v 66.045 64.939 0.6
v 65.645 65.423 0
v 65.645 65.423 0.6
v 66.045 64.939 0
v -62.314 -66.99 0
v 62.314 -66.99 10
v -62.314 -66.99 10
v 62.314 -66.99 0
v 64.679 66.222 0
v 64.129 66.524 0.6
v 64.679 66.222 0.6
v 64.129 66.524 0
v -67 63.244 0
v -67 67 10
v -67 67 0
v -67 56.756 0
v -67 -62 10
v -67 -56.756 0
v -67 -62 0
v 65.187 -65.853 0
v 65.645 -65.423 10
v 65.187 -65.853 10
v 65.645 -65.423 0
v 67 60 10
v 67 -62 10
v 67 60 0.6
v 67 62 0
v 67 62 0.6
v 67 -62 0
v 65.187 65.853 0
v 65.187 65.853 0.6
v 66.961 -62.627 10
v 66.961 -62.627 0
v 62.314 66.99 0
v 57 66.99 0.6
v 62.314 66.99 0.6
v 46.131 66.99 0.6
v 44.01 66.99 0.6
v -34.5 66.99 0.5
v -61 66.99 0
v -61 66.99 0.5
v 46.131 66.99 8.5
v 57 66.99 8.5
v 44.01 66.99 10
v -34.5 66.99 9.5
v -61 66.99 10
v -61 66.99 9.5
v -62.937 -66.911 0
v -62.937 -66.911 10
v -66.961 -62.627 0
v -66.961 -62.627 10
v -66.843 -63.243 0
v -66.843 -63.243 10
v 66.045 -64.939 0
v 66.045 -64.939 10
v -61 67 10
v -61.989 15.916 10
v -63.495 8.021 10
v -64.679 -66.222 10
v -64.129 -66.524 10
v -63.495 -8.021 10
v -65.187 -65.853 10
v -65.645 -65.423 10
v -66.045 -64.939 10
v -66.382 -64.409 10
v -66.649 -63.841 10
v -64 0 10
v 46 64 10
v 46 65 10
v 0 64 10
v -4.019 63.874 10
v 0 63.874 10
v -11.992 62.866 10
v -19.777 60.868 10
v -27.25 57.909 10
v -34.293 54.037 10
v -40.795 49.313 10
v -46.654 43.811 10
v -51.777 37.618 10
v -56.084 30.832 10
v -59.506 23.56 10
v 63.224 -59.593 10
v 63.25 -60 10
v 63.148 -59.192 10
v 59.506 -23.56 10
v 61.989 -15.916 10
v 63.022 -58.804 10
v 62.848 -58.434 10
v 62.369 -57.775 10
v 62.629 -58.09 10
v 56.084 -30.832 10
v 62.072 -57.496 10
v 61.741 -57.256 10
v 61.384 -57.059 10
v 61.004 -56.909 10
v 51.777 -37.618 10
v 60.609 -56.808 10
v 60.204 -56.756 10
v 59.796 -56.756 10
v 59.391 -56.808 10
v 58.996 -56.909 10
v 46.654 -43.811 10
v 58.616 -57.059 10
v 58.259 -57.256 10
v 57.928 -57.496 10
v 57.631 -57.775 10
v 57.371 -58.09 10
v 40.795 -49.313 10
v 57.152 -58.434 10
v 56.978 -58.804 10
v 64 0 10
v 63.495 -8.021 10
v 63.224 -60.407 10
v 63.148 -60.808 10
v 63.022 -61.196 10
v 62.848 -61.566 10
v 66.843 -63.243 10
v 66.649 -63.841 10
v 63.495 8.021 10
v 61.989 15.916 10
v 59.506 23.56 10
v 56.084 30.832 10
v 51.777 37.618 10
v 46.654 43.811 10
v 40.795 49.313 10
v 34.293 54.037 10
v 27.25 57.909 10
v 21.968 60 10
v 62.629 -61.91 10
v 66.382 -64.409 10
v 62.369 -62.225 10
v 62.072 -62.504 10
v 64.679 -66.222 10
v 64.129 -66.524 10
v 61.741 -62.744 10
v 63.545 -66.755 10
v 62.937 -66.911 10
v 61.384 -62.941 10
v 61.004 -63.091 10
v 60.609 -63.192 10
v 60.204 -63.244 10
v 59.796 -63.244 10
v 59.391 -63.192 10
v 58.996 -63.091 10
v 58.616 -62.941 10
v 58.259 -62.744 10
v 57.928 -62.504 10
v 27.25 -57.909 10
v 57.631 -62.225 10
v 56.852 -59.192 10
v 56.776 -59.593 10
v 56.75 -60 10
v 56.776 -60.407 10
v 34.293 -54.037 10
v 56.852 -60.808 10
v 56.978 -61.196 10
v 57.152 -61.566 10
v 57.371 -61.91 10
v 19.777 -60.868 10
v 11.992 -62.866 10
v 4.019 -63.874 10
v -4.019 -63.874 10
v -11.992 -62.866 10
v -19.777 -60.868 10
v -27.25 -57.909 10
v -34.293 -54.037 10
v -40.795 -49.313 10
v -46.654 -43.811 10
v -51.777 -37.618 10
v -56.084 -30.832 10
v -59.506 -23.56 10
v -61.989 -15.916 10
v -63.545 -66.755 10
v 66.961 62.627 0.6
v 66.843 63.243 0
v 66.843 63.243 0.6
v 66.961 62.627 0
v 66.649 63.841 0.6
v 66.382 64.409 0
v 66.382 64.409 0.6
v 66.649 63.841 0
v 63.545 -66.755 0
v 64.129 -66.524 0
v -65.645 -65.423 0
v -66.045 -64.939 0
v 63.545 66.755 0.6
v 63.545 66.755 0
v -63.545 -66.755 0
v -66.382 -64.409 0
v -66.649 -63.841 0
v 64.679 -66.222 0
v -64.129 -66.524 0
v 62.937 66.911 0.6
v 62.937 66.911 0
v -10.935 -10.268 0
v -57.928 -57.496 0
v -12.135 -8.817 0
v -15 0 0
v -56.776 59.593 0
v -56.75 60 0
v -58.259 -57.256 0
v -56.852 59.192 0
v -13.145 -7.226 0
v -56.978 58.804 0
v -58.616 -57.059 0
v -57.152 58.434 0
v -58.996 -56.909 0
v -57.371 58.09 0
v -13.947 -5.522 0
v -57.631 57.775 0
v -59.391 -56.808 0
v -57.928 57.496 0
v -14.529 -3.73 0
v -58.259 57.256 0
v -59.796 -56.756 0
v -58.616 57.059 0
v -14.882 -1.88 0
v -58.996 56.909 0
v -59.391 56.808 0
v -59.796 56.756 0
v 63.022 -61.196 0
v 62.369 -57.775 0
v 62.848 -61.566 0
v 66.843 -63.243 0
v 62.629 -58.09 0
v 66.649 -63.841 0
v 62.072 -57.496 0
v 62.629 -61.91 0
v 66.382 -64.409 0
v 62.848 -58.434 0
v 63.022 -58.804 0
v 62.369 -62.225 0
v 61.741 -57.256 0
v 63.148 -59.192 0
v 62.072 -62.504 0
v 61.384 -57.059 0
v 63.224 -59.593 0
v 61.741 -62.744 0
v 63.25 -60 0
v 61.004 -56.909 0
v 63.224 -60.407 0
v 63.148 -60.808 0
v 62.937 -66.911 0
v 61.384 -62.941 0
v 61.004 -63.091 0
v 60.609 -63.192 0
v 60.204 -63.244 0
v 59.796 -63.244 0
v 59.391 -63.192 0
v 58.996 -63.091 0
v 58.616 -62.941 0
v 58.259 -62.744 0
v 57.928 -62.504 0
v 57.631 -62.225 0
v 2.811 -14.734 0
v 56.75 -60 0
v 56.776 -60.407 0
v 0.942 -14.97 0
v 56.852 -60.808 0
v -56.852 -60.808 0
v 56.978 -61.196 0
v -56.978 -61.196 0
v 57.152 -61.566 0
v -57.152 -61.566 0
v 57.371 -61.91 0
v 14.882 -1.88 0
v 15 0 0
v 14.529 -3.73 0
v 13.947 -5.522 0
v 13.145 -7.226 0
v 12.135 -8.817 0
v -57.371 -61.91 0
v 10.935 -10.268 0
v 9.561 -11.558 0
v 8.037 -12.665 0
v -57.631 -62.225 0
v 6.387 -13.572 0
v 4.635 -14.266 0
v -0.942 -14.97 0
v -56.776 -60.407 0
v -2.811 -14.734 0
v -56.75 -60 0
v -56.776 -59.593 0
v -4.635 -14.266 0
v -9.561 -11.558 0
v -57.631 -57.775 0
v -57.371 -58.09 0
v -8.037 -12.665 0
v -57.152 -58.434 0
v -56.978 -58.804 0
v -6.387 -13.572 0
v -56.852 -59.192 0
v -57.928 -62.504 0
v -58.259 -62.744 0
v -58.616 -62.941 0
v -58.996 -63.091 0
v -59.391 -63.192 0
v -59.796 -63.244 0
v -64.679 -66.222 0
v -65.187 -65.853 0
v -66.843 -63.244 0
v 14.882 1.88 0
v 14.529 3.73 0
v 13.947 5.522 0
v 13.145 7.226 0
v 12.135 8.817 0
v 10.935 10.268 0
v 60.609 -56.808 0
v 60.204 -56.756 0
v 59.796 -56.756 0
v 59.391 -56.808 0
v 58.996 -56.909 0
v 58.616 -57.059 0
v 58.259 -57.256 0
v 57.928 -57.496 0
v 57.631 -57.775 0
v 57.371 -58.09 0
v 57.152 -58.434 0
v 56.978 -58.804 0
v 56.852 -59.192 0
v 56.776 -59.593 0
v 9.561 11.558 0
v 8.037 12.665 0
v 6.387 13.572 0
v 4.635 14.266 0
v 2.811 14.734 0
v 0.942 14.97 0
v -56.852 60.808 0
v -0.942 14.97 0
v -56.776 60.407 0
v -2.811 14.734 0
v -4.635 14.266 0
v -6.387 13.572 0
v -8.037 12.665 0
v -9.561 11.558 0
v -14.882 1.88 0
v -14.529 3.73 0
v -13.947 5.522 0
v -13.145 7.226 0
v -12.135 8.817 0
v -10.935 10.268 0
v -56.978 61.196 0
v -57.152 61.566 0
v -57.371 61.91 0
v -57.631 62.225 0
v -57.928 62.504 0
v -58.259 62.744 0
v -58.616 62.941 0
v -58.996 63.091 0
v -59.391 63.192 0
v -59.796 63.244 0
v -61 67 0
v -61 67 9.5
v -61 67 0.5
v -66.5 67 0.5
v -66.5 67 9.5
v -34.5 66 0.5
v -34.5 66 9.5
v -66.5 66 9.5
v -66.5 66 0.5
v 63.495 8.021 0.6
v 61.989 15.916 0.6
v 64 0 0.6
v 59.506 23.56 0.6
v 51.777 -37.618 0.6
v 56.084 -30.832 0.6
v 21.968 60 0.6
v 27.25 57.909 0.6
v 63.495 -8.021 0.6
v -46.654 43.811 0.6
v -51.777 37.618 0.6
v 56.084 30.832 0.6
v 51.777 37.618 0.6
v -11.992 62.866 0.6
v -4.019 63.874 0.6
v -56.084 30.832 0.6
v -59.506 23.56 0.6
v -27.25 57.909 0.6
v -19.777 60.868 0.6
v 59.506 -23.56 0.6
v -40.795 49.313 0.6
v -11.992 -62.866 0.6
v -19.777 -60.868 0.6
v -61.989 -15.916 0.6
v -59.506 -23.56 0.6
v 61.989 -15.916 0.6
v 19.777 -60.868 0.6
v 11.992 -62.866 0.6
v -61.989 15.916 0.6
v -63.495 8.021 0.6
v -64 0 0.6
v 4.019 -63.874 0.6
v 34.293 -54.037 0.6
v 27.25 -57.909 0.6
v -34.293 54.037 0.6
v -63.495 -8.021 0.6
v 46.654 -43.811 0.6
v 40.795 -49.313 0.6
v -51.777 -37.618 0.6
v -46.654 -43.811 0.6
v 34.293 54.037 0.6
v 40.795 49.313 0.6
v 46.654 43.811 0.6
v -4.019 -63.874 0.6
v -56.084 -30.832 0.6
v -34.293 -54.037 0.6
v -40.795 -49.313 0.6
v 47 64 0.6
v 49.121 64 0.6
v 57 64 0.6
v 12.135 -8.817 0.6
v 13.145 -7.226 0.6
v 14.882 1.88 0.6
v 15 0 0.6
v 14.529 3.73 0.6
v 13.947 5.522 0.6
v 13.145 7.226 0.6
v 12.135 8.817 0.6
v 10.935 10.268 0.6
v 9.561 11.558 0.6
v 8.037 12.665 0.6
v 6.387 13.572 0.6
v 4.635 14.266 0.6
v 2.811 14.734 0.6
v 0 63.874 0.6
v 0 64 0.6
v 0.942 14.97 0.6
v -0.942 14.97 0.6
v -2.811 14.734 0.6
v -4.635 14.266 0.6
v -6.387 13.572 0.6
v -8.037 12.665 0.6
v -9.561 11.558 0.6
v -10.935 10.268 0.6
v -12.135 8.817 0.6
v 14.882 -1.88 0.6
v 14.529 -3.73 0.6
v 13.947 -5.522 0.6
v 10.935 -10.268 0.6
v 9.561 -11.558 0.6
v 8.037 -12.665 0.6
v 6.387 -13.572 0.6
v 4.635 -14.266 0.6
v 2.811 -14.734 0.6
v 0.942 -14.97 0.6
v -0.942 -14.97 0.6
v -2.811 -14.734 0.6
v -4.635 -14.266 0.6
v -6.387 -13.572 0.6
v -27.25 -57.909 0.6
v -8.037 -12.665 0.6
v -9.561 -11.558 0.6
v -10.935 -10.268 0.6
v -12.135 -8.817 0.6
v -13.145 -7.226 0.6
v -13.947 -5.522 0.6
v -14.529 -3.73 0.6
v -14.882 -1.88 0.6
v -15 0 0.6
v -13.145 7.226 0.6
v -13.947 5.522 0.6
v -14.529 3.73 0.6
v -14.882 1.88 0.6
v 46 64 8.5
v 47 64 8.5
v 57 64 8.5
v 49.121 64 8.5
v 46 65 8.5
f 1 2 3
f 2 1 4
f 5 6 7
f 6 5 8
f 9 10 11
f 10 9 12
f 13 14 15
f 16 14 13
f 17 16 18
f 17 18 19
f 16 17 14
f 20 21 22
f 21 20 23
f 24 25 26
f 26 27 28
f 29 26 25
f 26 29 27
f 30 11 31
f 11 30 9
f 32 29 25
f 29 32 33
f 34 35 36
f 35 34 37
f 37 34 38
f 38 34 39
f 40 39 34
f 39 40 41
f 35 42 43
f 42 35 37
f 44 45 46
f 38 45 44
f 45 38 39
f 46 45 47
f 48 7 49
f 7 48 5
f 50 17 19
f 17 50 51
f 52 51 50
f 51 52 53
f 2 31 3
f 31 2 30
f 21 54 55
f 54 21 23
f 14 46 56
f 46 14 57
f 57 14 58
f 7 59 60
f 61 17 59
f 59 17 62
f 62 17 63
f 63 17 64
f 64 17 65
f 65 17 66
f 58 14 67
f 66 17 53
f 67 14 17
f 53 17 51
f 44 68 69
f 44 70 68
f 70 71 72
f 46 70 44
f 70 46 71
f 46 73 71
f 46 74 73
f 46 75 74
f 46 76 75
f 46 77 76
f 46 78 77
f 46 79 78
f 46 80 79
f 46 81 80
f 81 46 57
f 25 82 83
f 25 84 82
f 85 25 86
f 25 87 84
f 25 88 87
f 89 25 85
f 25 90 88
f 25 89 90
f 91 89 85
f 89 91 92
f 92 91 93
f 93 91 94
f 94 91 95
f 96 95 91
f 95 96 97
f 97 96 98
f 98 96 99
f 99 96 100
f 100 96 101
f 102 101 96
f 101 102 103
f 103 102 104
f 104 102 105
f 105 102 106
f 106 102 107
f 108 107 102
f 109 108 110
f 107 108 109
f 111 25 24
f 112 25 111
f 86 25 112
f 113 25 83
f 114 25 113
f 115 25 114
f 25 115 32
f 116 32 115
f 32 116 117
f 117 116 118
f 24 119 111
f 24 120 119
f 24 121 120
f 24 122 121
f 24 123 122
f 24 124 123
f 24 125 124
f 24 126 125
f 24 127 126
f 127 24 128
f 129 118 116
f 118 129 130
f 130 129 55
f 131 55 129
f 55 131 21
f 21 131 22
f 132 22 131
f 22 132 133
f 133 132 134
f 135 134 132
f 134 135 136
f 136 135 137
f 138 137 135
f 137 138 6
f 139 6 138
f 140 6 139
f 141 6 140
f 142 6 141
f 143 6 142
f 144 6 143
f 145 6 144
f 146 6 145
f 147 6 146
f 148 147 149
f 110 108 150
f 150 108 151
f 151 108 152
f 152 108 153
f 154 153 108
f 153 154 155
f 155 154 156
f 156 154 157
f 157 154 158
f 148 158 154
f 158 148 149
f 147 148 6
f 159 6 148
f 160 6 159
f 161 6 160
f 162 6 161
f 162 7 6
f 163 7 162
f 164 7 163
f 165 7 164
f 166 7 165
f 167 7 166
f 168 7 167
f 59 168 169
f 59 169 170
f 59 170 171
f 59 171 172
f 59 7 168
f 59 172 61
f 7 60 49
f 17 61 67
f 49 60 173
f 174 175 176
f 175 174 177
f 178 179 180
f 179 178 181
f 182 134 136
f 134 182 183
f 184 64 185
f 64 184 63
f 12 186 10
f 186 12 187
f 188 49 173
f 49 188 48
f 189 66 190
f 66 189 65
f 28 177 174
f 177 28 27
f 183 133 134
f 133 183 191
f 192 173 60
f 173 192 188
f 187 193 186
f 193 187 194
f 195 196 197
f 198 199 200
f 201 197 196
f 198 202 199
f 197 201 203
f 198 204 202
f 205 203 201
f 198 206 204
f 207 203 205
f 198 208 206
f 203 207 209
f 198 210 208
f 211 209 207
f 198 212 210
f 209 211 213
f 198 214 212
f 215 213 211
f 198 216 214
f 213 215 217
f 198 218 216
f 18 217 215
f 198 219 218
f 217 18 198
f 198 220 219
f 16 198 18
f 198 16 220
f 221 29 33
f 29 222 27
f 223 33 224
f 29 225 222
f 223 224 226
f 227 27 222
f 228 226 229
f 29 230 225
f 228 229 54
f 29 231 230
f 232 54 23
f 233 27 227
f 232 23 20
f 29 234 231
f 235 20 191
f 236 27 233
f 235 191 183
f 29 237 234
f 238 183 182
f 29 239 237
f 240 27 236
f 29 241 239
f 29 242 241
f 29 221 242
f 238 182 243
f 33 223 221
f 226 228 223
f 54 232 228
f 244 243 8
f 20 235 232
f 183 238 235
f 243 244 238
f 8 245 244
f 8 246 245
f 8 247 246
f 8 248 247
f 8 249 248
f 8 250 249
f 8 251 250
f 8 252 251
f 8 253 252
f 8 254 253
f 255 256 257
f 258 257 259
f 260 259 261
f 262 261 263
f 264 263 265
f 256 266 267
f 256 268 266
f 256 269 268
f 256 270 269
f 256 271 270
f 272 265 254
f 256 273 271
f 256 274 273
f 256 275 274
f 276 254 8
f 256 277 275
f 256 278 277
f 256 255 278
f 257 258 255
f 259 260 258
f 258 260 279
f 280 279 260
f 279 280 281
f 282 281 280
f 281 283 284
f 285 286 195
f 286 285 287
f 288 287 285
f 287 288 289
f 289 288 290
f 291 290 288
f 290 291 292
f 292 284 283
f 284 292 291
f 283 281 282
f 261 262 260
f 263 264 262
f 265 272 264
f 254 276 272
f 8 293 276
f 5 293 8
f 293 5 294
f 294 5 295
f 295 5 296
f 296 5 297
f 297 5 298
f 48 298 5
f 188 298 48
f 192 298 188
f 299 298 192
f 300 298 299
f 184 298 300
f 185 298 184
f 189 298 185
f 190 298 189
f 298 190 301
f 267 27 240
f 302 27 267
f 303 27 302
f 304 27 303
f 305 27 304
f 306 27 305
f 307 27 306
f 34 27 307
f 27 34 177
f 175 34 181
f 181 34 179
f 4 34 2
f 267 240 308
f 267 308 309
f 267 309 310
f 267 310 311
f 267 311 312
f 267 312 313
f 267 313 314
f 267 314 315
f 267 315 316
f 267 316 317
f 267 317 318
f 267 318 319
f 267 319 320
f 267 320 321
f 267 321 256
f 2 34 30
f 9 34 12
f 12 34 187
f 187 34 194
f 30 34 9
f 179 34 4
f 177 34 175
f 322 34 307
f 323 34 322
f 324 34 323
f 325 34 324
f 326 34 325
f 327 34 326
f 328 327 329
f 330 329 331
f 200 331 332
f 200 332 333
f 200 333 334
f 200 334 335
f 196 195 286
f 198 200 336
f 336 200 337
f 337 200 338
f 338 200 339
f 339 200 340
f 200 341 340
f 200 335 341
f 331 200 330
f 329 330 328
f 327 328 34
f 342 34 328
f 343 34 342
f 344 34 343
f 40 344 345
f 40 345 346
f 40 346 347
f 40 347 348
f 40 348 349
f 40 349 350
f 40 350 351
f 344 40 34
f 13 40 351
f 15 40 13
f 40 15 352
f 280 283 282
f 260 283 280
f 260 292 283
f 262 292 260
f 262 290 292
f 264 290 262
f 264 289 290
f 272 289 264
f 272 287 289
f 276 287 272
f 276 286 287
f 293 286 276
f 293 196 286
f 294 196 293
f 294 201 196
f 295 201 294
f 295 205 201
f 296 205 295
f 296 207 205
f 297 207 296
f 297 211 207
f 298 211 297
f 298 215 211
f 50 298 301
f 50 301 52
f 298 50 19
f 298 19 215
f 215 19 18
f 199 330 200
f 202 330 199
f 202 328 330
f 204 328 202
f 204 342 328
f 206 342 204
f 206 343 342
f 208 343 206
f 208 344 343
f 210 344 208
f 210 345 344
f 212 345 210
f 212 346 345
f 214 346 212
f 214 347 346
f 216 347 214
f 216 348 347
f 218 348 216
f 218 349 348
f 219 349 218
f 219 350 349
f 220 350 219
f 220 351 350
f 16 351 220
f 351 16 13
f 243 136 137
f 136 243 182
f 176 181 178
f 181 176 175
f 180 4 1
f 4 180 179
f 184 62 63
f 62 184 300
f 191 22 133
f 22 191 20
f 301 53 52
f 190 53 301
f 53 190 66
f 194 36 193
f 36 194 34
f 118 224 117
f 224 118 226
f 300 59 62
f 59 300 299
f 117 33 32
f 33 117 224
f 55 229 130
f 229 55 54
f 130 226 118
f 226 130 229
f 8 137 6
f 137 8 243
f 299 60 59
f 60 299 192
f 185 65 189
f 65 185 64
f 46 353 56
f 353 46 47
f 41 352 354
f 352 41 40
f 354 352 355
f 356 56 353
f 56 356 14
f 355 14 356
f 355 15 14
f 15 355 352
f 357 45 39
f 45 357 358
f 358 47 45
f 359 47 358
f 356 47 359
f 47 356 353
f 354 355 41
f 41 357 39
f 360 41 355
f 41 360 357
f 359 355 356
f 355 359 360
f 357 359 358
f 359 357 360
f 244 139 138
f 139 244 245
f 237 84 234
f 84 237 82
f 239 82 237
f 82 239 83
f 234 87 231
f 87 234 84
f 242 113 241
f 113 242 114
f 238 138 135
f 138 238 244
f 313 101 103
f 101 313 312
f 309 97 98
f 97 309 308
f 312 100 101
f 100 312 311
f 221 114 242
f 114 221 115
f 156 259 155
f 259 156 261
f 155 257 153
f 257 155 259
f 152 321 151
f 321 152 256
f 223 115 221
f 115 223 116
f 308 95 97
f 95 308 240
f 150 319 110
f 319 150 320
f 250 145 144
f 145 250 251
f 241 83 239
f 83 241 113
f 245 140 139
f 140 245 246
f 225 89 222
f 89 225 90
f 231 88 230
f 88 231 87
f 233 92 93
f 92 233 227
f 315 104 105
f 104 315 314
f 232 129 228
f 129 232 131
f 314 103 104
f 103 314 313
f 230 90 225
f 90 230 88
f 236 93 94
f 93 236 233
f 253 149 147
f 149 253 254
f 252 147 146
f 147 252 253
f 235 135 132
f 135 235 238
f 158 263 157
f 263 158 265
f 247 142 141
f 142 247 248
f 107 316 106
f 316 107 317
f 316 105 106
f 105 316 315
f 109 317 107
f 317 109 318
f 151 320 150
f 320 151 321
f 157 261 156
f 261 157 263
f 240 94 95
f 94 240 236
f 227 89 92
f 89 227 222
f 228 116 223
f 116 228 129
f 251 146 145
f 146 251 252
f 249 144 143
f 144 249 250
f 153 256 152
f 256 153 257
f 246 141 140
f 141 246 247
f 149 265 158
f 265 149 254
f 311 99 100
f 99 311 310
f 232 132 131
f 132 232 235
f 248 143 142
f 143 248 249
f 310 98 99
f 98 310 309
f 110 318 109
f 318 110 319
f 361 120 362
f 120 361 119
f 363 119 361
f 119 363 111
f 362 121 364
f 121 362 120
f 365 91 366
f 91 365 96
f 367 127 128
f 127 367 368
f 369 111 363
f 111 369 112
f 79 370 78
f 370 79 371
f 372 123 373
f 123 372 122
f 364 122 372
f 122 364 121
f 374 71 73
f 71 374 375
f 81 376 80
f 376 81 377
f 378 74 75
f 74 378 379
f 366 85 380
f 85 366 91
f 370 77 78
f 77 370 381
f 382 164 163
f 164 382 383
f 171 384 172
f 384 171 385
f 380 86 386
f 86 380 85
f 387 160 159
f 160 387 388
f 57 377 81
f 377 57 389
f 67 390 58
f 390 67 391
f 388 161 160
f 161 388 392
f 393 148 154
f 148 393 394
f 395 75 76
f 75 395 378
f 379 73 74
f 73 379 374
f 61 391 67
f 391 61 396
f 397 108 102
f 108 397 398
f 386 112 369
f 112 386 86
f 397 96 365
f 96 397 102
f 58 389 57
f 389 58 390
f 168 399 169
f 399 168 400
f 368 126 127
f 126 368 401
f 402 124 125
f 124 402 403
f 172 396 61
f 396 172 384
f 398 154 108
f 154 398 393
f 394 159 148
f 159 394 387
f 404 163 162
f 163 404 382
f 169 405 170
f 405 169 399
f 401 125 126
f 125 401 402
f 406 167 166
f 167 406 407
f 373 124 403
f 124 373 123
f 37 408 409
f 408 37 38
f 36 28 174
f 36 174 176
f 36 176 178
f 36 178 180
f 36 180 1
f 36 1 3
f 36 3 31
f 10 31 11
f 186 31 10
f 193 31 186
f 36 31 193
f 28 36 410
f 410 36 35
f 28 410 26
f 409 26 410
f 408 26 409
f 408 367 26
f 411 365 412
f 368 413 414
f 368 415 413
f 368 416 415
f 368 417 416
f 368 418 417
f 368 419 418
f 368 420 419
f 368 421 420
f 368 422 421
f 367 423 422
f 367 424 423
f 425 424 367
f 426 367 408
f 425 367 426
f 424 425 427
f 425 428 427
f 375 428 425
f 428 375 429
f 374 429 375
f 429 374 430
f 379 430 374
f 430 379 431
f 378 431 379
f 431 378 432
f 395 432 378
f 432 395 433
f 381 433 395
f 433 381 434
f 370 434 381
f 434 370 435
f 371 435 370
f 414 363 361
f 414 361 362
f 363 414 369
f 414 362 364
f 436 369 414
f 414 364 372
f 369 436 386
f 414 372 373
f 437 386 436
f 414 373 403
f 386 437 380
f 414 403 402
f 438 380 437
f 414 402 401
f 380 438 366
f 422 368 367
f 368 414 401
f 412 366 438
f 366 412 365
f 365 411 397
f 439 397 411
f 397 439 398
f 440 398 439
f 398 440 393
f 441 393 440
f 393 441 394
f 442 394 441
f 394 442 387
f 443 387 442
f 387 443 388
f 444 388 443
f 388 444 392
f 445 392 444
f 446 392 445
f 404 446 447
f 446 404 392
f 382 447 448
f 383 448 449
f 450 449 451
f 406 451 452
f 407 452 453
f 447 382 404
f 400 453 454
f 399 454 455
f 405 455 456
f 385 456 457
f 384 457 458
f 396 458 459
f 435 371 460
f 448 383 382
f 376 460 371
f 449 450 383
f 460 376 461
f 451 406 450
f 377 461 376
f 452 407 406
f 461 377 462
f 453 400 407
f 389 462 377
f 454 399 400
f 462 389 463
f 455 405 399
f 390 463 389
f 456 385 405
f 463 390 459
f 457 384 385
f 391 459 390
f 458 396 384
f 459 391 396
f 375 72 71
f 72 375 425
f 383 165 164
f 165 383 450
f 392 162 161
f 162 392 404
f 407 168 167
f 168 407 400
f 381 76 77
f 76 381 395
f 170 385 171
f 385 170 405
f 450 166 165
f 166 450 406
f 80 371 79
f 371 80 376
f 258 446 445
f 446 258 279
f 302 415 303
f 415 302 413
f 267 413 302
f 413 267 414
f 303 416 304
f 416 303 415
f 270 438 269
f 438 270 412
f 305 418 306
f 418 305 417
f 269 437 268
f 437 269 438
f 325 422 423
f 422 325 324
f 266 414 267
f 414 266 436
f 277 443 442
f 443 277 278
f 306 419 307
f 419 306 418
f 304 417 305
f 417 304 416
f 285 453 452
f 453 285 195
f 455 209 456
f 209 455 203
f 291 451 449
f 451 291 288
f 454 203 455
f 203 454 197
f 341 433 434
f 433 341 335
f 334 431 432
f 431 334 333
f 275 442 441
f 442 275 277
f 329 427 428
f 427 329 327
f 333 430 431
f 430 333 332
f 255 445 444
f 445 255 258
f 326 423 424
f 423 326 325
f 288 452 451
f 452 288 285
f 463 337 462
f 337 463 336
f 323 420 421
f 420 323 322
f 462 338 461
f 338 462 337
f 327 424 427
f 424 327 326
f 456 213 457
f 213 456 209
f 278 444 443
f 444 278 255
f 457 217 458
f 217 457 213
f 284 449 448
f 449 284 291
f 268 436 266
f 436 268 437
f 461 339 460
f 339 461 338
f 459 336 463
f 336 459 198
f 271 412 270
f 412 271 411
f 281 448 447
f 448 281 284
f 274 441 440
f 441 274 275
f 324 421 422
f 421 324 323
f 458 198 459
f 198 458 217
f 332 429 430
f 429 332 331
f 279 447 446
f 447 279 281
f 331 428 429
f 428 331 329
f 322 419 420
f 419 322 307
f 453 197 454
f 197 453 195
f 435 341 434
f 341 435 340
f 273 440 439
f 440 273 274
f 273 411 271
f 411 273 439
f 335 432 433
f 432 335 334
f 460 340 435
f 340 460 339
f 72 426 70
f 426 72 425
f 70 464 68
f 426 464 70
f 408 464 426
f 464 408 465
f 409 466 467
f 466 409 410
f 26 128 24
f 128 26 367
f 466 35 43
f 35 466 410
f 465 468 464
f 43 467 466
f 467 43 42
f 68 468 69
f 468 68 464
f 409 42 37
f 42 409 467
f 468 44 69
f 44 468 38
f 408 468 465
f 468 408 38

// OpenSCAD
$fn = 50;


difference() {
	union() {
		hull() {
			translate(v = [-62.0000000000, 62.0000000000, 0]) {
				cylinder(h = 10, r = 5);
			}
			translate(v = [62.0000000000, 62.0000000000, 0]) {
				cylinder(h = 10, r = 5);
			}
			translate(v = [-62.0000000000, -62.0000000000, 0]) {
				cylinder(h = 10, r = 5);
			}
			translate(v = [62.0000000000, -62.0000000000, 0]) {
				cylinder(h = 10, r = 5);
			}
		}
		translate(v = [-67.0000000000, 61.0000000000, 0]) {
			cube(size = [6, 6, 10]);
		}
	}
	union() {
		translate(v = [-67.5000000000, -60.0000000000, -250.0000000000]) {
			rotate(a = [0, 0, 0]) {
				difference() {
					union() {
						hull() {
							translate(v = [7.5000000000, 0, 0]) {
								cylinder(h = 250, r = 3.2500000000, r1 = 3.2500000000, r2 = 3.2500000000);
							}
							translate(v = [-7.5000000000, 0, 0]) {
								cylinder(h = 250, r = 3.2500000000, r1 = 3.2500000000, r2 = 3.2500000000);
							}
						}
					}
					union();
				}
			}
		}
		translate(v = [-67.5000000000, 60.0000000000, -250.0000000000]) {
			rotate(a = [0, 0, 0]) {
				difference() {
					union() {
						hull() {
							translate(v = [7.5000000000, 0, 0]) {
								cylinder(h = 250, r = 3.2500000000, r1 = 3.2500000000, r2 = 3.2500000000);
							}
							translate(v = [-7.5000000000, 0, 0]) {
								cylinder(h = 250, r = 3.2500000000, r1 = 3.2500000000, r2 = 3.2500000000);
							}
						}
					}
					union();
				}
			}
		}
		translate(v = [-66.5000000000, 66.0000000000, 0.5000000000]) {
			cube(size = [32, 1, 9.0000000000]);
		}
		translate(v = [60.0000000000, -60.0000000000, -50.0000000000]) {
			cylinder(h = 100, r = 3.2500000000);
		}
		translate(v = [0, 0, 0.6000000000]) {
			cylinder(h = 12.4000000000, r = 64.0000000000);
		}
		translate(v = [0, 0, -5.0000000000]) {
			cylinder(h = 10, r = 15.0000000000);
		}
		translate(v = [0.0000000000, 60.0000000000, 0.6000000000]) {
			cube(size = [67.0000000000, 4, 12.4000000000]);
		}
		translate(v = [57.0000000000, 60.0000000000, 0.6000000000]) {
			cube(size = [10, 7, 12.4000000000]);
		}
		translate(v = [46.0000000000, 60.0000000000, 8.5000000000]) {
			cube(size = [21, 7, 1.5000000000]);
		}
		translate(v = [43.2500000000, 67.7500000000, 0.6000000000]) {
			rotate(a = [0, 0, -45]) {
				cube(size = [7.5000000000, 1.5000000000, 12.4000000000]);
			}
		}
		translate(v = [12.0610000000, 58.0000000000, 0.6000000000]) {
			cube(size = [7.5000000000, 2, 9.4000000000]);
		}
	}
}
